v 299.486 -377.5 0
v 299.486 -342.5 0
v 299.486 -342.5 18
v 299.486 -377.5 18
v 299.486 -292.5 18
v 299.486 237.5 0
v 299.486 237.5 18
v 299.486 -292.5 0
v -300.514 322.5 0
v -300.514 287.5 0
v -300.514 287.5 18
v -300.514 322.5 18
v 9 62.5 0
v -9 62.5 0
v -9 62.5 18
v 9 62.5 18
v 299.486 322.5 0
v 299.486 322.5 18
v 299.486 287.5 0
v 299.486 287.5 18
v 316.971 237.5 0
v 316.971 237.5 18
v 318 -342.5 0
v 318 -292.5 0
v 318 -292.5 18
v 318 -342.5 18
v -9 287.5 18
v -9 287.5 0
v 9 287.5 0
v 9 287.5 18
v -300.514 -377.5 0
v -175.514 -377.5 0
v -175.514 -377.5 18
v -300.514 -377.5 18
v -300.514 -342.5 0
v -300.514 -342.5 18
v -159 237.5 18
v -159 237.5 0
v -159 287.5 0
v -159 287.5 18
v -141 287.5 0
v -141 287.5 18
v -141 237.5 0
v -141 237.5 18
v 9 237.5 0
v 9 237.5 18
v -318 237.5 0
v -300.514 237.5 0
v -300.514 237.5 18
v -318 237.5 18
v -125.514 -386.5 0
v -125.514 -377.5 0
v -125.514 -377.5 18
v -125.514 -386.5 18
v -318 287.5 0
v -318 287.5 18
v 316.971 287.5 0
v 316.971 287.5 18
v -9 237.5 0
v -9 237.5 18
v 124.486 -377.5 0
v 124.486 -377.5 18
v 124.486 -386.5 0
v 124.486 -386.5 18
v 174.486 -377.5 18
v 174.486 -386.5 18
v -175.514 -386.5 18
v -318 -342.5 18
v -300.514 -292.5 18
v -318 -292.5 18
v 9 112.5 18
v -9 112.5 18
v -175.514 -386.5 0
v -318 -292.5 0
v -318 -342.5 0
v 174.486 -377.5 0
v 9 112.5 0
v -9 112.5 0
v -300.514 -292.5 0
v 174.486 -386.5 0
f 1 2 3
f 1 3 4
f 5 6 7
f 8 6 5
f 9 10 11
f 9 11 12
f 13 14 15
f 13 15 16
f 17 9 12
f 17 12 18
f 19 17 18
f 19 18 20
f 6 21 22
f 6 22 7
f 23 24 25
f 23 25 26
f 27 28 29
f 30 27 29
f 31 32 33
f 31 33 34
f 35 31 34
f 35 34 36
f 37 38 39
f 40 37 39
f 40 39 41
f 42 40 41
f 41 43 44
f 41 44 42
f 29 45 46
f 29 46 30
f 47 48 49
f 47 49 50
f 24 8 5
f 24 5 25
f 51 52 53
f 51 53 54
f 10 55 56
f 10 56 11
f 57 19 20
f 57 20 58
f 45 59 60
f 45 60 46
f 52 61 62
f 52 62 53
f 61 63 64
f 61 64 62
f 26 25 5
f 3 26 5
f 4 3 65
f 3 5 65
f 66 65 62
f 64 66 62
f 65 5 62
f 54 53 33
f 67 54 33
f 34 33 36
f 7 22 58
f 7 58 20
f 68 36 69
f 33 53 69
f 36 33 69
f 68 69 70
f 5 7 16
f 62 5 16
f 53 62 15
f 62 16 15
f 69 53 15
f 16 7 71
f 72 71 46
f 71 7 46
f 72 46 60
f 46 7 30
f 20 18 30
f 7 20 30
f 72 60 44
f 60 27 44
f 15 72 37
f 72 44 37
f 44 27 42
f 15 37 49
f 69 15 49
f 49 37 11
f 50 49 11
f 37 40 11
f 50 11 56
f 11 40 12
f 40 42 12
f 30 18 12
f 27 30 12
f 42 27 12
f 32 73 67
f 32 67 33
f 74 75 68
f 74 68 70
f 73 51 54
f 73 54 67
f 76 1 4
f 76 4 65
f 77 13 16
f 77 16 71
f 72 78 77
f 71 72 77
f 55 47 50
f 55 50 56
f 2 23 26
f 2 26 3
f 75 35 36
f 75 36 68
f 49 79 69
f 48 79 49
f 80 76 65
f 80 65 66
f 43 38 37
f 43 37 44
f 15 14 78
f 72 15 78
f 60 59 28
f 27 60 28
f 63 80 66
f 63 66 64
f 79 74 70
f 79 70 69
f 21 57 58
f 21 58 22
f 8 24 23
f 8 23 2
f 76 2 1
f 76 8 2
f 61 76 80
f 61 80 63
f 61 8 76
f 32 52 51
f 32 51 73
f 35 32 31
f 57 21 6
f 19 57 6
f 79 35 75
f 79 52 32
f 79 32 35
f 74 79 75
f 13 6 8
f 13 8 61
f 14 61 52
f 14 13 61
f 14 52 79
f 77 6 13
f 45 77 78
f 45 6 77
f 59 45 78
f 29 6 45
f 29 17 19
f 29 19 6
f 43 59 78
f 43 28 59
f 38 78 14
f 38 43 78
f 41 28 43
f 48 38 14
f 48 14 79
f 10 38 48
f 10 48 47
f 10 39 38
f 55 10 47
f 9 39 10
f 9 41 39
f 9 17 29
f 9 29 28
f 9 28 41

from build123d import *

# Parameters (mm, degrees)
SKETCH1_W           = 18
SKETCH1_H           = 50
BOSS_EXTRUDE1_DEPTH = 18


with BuildPart() as part:
    # Sketch1 → Boss-Extrude1 (new body)
    with BuildSketch(Plane.XY):
        Polygon((-300.514492677, 322.5), (299.485507323, 322.5), (299.485507323, 287.5), (316.971014646, 287.5), (316.971014646, 237.5), (299.485507323, 237.5), (299.485507323, -292.5), (318, -292.5), (318, -342.5), (299.485507323, -342.5), (299.485507323, -377.5), (174.485507323, -377.5), (174.485507323, -386.5), (124.485507323, -386.5), (124.485507323, -377.5), (-125.514492677, -377.5), (-125.514492677, -386.5), (-175.514492677, -386.5), (-175.514492677, -377.5), (-300.514492677, -377.5), (-300.514492677, -342.5), (-318, -342.5), (-318, -292.5), (-300.514492677, -292.5), (-300.514492677, 237.5), (-318, 237.5), (-318, 287.5), (-300.514492677, 287.5), align=None)
        with Locations((-150, 262.5)):
            Rectangle(SKETCH1_W, SKETCH1_H, mode=Mode.SUBTRACT)
        with Locations((0, 262.5)):
            Rectangle(SKETCH1_W, SKETCH1_H, mode=Mode.SUBTRACT)
        with Locations((0, 87.5)):
            Rectangle(SKETCH1_W, SKETCH1_H, mode=Mode.SUBTRACT)
    extrude(amount=BOSS_EXTRUDE1_DEPTH)


solid = part.part
